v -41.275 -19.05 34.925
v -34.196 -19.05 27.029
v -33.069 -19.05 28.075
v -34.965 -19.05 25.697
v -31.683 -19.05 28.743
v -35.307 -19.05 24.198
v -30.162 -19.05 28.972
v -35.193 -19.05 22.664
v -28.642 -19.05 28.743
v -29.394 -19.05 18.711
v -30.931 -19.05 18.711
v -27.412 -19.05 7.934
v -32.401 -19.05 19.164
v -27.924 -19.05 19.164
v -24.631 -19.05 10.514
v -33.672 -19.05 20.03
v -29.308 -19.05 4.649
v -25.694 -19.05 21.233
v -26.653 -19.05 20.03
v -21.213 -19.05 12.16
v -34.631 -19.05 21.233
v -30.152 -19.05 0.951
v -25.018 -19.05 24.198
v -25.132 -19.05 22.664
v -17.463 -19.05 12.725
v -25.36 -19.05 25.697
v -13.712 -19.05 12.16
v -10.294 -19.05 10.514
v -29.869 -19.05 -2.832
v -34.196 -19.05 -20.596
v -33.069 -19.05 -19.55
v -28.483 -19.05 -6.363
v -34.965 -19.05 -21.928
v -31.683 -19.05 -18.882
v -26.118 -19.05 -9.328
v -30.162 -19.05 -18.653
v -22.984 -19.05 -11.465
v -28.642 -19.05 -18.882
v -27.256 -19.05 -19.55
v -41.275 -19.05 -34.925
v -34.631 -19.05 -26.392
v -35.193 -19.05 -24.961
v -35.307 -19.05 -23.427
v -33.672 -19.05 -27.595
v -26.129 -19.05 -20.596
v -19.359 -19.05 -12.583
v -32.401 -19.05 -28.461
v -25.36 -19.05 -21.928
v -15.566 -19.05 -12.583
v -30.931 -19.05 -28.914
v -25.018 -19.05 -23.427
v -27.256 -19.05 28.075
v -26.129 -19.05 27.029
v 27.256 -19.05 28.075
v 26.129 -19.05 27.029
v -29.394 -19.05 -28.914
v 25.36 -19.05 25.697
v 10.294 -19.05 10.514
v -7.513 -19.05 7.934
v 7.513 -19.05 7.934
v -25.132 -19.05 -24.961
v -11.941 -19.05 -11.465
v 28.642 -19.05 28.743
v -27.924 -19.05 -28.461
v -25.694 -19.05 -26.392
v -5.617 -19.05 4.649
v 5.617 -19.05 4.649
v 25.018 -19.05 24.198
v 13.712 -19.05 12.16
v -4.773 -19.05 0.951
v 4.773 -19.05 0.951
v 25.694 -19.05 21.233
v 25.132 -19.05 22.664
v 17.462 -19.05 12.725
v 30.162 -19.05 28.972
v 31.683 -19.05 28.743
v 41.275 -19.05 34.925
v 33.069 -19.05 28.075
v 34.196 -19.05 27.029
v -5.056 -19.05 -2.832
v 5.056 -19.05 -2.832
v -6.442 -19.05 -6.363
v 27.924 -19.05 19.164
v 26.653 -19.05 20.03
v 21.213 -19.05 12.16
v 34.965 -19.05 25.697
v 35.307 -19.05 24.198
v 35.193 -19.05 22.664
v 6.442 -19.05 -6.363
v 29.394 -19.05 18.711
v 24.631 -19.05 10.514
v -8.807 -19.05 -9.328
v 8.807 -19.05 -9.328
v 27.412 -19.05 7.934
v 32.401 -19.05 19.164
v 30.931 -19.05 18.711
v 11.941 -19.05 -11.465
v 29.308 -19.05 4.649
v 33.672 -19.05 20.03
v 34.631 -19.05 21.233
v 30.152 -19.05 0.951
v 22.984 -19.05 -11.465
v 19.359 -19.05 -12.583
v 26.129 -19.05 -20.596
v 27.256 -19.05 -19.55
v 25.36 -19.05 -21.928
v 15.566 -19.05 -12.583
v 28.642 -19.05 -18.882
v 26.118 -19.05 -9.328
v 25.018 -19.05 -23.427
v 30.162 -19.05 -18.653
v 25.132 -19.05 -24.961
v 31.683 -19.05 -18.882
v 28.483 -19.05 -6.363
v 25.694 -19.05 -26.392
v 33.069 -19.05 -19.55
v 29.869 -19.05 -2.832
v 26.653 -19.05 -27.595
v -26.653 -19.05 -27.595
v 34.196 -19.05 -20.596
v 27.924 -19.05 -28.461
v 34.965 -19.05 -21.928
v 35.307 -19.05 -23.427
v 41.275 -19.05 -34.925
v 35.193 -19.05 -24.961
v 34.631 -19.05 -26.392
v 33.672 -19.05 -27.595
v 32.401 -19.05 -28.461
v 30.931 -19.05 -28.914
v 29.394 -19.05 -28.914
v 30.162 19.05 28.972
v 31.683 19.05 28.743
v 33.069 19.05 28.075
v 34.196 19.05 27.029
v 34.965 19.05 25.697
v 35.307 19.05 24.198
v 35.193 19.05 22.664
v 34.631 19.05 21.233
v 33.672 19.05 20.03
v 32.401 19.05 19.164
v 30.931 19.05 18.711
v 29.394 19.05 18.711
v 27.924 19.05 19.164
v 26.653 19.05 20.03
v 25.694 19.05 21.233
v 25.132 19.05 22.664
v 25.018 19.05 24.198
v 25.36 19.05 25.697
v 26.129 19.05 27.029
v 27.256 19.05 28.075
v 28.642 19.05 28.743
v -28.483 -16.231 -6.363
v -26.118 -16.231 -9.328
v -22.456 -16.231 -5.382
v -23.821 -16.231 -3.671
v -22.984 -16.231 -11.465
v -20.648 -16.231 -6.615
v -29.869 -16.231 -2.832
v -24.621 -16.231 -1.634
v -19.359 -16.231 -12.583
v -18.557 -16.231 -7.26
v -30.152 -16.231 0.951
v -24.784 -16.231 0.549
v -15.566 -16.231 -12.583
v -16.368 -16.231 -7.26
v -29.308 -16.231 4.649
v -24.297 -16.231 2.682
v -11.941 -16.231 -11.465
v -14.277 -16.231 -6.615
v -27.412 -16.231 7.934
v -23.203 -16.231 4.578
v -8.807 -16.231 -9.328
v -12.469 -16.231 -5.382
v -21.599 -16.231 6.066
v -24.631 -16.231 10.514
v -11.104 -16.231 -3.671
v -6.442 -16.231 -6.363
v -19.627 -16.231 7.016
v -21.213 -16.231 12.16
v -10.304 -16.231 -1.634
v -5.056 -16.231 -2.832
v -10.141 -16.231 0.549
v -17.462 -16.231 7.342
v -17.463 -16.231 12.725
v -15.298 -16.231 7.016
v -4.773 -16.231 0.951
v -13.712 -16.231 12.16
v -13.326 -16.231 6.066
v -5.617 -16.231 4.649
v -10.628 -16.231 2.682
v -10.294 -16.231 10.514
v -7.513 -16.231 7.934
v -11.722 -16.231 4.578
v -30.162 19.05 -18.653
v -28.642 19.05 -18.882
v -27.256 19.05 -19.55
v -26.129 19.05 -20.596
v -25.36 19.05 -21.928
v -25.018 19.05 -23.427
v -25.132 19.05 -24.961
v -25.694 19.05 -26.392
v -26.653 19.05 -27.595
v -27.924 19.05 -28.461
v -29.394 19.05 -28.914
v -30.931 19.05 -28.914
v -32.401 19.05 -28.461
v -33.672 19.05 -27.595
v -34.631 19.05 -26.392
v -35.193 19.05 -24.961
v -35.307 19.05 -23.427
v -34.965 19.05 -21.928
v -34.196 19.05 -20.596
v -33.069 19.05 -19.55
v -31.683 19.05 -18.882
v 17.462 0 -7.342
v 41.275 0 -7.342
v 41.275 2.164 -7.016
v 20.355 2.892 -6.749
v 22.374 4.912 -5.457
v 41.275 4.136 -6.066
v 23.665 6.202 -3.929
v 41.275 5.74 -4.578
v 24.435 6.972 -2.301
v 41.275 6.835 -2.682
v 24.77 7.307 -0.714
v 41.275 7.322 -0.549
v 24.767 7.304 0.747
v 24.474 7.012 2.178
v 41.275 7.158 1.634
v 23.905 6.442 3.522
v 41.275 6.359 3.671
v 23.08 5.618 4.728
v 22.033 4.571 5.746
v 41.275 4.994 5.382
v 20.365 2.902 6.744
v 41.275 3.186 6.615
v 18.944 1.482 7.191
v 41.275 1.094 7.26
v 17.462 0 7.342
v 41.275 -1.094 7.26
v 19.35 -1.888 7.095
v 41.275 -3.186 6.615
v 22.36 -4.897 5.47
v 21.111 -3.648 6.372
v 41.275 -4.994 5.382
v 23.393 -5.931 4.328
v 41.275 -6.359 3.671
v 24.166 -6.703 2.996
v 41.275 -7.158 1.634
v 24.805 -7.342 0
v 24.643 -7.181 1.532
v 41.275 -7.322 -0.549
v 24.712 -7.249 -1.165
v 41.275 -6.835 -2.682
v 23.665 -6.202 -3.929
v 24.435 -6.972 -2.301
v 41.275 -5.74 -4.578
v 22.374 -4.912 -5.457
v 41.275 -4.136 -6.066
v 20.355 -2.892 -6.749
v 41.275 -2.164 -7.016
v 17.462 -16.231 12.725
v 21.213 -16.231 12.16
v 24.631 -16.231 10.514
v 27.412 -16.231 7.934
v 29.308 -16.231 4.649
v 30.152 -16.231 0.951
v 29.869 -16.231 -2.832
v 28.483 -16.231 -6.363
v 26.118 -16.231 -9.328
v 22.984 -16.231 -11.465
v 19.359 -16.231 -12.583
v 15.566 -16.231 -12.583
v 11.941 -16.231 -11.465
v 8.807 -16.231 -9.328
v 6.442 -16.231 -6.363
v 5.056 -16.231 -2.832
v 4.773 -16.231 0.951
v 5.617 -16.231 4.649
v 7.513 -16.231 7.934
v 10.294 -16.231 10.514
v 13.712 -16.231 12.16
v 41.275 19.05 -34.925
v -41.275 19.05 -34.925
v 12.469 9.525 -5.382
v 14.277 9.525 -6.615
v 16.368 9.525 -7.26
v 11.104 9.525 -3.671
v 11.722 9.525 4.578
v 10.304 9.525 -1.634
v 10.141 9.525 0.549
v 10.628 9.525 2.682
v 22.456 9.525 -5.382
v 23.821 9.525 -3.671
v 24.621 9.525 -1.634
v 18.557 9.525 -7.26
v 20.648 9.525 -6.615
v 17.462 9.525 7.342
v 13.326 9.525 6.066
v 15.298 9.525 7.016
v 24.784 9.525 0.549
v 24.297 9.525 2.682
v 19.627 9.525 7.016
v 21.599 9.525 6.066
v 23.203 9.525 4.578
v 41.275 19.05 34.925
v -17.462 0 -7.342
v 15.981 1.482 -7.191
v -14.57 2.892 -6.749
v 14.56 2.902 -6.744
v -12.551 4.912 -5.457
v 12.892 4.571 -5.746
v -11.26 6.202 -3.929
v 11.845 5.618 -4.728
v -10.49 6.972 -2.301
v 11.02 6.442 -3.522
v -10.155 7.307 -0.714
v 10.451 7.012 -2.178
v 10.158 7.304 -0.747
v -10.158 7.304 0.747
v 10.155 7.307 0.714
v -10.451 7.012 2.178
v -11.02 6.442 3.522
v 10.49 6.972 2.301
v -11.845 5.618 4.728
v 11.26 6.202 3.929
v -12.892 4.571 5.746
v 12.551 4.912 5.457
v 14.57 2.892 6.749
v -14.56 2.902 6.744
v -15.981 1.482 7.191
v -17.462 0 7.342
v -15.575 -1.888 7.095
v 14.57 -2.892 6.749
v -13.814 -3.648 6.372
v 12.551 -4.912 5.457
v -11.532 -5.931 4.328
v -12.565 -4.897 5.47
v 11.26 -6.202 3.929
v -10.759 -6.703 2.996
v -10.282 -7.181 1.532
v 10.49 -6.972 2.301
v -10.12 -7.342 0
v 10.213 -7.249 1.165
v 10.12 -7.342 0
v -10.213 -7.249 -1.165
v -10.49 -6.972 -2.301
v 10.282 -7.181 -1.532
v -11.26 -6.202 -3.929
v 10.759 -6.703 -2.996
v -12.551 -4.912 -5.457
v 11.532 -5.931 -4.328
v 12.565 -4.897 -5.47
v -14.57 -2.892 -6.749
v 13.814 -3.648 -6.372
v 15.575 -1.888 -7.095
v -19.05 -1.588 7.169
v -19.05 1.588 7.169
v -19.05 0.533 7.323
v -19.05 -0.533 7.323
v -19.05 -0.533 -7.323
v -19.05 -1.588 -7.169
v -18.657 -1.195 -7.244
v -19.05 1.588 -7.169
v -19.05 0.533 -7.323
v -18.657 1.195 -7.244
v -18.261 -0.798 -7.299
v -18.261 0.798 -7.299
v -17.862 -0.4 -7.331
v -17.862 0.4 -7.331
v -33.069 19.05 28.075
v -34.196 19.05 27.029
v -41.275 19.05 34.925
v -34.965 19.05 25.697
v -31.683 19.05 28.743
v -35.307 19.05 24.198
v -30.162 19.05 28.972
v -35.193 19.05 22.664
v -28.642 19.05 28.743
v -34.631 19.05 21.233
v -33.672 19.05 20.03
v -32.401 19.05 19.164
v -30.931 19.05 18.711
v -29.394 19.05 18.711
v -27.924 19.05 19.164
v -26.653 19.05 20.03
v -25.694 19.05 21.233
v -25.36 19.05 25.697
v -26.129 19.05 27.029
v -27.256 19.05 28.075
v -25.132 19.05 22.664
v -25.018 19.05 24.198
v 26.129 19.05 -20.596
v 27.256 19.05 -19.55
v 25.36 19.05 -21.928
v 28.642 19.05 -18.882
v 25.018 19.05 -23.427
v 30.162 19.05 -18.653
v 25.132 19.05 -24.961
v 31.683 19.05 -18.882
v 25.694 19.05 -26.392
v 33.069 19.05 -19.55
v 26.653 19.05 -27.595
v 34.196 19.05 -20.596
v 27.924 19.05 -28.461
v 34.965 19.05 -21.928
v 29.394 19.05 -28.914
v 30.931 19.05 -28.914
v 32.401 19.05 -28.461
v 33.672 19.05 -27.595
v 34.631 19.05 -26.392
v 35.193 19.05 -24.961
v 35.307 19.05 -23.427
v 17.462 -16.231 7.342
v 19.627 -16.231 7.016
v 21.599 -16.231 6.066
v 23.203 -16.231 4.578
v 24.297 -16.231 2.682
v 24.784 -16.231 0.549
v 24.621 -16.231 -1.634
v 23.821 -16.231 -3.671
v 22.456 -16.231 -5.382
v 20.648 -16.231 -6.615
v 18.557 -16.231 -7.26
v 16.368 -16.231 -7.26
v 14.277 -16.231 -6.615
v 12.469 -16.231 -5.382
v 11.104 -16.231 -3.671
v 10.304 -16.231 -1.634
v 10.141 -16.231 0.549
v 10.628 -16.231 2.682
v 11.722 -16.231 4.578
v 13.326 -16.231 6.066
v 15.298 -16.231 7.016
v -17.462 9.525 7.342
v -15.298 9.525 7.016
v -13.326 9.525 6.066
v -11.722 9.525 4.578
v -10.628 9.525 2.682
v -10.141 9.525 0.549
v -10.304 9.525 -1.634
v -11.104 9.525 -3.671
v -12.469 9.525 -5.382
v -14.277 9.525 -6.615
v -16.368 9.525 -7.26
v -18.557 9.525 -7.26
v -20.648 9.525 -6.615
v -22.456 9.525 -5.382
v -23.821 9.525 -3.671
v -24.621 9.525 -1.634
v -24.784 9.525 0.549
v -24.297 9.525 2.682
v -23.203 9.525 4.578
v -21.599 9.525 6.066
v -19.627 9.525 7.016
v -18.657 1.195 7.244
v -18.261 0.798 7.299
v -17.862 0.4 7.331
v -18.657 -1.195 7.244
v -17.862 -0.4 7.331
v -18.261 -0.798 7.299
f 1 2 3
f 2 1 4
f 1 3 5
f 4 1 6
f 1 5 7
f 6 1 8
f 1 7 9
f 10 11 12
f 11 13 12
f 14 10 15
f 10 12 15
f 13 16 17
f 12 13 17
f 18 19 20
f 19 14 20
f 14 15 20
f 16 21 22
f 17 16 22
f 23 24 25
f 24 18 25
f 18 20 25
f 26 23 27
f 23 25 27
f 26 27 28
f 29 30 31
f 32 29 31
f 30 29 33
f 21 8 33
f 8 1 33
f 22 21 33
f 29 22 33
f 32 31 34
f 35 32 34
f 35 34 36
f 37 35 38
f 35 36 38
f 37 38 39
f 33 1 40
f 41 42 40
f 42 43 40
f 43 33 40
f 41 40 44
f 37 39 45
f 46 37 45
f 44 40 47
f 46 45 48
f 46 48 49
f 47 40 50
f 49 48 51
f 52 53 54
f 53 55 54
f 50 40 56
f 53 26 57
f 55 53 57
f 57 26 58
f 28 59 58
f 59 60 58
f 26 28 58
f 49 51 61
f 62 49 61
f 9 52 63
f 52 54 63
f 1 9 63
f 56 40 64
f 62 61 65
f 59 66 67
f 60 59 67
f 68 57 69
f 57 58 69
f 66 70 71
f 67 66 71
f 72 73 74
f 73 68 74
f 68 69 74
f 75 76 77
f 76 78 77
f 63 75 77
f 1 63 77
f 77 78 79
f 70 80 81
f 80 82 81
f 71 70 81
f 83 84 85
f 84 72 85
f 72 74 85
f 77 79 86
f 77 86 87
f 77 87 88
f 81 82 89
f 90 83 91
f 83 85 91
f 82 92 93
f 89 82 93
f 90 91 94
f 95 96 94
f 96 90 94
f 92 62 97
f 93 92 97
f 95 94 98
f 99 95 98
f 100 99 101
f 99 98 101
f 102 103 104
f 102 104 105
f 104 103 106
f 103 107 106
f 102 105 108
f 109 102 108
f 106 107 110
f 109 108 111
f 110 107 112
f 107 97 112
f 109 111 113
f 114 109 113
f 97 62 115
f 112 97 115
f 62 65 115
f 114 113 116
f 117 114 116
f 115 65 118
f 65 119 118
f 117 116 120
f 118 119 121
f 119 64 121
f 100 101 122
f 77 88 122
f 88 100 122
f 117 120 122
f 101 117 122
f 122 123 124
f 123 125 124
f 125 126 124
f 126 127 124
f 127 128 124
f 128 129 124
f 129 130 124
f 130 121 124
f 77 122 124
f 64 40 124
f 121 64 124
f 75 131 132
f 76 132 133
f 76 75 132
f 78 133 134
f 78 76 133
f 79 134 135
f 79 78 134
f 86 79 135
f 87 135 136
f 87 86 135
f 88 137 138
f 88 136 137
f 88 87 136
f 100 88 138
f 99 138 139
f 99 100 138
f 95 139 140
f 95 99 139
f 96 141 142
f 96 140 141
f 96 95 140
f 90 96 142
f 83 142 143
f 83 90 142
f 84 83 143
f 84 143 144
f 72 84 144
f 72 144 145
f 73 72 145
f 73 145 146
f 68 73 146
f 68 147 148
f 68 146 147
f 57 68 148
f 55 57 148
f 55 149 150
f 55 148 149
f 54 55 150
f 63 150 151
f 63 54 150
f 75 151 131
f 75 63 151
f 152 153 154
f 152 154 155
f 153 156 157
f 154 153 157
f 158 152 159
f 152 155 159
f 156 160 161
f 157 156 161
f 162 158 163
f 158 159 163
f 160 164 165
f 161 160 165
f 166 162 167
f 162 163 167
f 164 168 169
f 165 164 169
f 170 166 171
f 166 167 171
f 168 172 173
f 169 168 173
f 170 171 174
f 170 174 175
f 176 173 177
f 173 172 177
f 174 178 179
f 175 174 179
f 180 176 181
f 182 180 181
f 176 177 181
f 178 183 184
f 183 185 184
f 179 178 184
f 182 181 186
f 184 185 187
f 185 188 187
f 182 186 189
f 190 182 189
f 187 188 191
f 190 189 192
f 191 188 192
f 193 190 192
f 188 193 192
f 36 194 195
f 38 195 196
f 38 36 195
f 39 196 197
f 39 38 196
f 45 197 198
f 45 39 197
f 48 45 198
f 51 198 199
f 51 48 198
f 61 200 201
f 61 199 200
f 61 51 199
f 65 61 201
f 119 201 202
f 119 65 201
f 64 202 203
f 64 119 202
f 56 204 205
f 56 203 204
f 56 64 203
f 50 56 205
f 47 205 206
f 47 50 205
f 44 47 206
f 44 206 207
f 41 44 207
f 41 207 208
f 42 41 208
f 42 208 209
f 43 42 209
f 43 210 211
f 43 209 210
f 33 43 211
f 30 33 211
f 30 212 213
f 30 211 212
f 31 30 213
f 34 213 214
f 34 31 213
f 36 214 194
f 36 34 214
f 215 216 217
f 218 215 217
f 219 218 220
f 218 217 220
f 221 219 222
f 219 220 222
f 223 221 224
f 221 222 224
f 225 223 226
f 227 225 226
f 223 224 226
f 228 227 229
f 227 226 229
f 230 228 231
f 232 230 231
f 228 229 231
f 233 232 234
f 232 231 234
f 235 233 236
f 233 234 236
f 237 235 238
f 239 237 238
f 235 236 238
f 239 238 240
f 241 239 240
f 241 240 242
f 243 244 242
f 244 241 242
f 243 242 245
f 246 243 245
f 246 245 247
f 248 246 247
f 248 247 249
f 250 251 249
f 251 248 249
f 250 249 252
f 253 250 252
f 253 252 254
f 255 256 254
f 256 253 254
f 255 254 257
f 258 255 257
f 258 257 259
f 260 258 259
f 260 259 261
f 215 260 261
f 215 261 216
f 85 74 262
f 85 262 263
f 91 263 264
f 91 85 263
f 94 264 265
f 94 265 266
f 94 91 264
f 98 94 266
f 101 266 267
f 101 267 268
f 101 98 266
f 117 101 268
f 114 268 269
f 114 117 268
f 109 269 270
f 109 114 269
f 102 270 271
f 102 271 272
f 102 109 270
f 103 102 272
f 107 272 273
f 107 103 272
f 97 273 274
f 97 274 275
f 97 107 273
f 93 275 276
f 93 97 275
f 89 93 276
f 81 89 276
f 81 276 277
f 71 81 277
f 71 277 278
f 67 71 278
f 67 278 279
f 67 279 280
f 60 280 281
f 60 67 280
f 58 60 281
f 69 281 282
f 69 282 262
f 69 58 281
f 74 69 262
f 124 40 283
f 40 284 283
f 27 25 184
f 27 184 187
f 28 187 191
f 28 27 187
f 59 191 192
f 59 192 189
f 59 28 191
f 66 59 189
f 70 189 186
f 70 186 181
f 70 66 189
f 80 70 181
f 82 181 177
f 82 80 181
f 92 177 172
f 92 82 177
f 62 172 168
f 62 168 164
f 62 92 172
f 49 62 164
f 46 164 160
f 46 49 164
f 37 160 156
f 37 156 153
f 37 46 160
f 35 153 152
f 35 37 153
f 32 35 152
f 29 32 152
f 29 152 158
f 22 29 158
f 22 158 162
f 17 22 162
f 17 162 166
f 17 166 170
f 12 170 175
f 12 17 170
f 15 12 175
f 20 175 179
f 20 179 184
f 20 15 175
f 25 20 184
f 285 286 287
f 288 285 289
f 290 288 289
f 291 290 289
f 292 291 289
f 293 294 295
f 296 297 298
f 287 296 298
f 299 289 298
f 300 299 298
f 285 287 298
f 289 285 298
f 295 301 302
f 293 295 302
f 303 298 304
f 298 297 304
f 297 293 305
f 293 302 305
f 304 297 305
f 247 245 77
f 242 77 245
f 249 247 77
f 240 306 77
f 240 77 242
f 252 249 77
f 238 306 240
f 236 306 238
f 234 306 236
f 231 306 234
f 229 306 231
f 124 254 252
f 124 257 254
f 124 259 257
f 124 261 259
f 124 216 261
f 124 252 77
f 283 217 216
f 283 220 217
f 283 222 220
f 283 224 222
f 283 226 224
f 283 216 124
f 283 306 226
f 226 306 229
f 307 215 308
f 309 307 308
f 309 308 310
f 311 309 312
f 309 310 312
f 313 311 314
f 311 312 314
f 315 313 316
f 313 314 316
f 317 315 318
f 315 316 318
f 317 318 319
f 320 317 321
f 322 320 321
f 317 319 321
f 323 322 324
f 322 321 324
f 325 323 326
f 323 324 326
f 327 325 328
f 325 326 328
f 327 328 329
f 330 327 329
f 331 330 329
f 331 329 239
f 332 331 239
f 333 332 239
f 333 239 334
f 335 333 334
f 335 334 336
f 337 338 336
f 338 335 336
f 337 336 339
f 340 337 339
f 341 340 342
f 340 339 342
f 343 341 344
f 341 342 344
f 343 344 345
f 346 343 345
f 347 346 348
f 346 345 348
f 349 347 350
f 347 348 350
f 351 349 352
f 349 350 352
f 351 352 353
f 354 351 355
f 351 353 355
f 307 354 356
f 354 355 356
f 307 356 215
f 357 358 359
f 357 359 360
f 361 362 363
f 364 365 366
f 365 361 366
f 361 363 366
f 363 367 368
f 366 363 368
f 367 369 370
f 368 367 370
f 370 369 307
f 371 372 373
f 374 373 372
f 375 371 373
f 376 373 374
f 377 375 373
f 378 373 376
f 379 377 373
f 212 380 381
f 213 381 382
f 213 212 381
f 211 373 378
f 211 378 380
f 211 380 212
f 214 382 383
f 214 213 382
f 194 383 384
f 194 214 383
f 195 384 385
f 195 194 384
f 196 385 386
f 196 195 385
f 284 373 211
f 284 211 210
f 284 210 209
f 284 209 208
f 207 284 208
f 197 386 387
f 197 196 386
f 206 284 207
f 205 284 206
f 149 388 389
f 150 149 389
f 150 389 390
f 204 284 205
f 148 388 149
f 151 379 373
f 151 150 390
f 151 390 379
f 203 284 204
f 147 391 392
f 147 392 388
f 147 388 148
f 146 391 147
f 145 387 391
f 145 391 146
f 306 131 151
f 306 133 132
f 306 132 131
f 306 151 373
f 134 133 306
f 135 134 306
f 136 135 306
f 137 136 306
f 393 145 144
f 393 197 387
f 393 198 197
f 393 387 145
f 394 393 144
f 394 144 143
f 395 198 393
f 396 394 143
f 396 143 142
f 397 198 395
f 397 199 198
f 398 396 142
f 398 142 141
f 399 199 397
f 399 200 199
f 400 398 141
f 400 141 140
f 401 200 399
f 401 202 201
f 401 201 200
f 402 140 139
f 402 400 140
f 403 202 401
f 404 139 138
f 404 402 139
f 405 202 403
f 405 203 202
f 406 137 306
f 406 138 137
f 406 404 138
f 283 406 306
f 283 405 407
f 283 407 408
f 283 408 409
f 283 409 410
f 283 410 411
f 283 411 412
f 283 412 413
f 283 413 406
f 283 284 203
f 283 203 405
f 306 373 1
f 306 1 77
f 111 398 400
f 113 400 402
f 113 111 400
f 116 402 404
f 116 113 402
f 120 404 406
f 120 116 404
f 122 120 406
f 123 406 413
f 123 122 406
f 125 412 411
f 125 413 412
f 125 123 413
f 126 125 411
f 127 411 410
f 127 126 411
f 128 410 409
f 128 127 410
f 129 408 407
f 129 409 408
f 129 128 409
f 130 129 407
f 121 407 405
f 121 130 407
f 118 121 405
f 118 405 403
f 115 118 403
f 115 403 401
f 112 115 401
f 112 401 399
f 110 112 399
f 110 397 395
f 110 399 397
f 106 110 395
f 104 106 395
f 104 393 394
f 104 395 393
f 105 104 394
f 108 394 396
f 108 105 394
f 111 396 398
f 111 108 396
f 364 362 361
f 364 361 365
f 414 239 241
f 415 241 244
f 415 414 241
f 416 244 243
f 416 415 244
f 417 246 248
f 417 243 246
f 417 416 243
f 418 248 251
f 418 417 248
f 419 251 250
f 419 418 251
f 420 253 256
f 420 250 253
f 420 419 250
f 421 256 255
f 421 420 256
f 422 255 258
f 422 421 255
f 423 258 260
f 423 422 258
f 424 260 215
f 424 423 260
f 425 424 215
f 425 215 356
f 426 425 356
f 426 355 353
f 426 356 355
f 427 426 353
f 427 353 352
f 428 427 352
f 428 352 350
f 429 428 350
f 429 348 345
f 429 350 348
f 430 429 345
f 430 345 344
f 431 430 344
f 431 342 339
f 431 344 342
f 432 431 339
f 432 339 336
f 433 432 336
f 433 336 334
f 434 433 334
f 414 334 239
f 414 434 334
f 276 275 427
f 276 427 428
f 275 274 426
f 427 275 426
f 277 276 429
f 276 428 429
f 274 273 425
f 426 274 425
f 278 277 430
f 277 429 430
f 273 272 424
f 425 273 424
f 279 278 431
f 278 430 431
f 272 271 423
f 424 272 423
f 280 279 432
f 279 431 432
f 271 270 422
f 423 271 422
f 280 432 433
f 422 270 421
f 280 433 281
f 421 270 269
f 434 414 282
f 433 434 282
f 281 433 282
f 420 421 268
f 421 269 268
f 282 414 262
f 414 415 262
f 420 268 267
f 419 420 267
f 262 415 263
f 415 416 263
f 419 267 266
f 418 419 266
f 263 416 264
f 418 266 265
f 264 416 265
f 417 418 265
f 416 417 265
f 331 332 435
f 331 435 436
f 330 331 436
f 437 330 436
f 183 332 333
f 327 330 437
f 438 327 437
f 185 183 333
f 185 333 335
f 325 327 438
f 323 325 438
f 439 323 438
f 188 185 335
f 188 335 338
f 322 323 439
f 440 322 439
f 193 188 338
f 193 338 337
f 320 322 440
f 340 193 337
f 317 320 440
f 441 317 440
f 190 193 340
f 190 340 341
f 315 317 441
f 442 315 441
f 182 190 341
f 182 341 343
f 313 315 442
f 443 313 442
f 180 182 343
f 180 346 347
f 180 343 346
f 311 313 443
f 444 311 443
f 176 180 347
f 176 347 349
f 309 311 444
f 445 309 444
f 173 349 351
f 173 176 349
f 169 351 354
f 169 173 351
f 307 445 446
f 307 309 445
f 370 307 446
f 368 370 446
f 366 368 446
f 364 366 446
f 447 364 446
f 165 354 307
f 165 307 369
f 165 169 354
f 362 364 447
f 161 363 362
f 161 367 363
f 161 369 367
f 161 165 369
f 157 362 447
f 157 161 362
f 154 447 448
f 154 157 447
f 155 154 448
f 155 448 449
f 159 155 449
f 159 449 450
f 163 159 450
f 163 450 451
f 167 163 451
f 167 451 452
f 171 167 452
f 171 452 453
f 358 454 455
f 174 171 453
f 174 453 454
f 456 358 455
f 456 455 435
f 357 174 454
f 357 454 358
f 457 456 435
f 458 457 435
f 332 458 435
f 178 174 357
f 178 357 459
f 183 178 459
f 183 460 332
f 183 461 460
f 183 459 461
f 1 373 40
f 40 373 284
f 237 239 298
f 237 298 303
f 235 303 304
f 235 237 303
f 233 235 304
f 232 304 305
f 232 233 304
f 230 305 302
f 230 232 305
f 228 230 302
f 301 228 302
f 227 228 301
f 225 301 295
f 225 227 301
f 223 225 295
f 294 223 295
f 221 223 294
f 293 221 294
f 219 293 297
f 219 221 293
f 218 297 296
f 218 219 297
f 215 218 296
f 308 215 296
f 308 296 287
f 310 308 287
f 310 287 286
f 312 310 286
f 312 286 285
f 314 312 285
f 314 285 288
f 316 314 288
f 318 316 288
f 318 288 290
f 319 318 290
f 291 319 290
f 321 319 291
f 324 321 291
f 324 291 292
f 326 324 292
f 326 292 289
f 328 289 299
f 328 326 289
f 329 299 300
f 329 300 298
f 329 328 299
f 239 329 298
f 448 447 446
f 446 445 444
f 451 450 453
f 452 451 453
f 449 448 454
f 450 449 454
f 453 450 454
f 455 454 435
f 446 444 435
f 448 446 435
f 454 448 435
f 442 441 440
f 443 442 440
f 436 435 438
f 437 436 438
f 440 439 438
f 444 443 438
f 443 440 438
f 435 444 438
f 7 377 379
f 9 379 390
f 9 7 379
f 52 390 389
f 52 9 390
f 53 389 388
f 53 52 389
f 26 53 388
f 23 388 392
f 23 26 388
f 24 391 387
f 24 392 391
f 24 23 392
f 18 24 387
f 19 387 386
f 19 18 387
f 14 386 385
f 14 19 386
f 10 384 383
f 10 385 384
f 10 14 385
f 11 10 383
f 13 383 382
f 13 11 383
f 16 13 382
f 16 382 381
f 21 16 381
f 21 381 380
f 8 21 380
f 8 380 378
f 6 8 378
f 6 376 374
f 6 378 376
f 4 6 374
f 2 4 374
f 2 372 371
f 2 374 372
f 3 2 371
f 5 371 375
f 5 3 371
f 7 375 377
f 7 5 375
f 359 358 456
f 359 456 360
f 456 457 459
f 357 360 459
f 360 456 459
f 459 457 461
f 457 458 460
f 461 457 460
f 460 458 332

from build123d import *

# Parameters (mm, degrees)
SKETCH1_W           = 82.55
SKETCH1_H           = 69.85
BOSS_EXTRUDE1_DEPTH = 19.05
CUT_EXTRUDE2_START  = -19.05
SKETCH2_R           = 5.159375
CUT_EXTRUDE2_DEPTH  = 77.376117521
CUT_EXTRUDE4_START  = -19.05
SKETCH3_R           = 7.3421875
CUT_EXTRUDE4_DEPTH  = 28.575
CUT_EXTRUDE6_START  = -19.05
SKETCH4_R           = 12.7254
CUT_EXTRUDE6_DEPTH  = 2.8194
CUT_EXTRUDE8_START  = 41.275
SKETCH5_R           = 7.3421875
CUT_EXTRUDE8_DEPTH  = 60.325


with BuildPart() as part:
    # Sketch1 → Boss-Extrude1 (new, symmetric)
    with BuildSketch(Plane(origin=(0, 0, 0), x_dir=(1, 0, 0), z_dir=(0, 1, 0))):
        Rectangle(SKETCH1_W, SKETCH1_H)
    extrude(amount=BOSS_EXTRUDE1_DEPTH, both=True)

    # Sketch2 → Cut-Extrude2 (cut, through all)
    with BuildSketch(Plane(origin=(0, 0, 0), x_dir=(1, 0, 0), z_dir=(0, 1, 0)).offset(CUT_EXTRUDE2_START)):
        with Locations(Location((-30.1625, -23.8125, 0), (0, 0, 270))):
            Circle(SKETCH2_R)
        with Locations(Location((30.1625, -23.8125, 0), (0, 0, 270))):
            Circle(SKETCH2_R)
        with Locations(Location((-30.1625, 23.8125, 0), (0, 0, 270))):
            Circle(SKETCH2_R)
        with Locations(Location((30.1625, 23.8125, 0), (0, 0, 270))):
            Circle(SKETCH2_R)
    extrude(amount=CUT_EXTRUDE2_DEPTH, mode=Mode.SUBTRACT)

    # Sketch3 → Cut-Extrude4 (cut)
    with BuildSketch(Plane(origin=(0, 0, 0), x_dir=(1, 0, 0), z_dir=(0, 1, 0)).offset(CUT_EXTRUDE4_START)):
        with Locations(Location((-17.4625, 0, 0), (0, 0, 270))):
            Circle(SKETCH3_R)
        with Locations(Location((17.4625, 0, 0), (0, 0, 270))):
            Circle(SKETCH3_R)
    extrude(amount=CUT_EXTRUDE4_DEPTH, mode=Mode.SUBTRACT)

    # Sketch4 → Cut-Extrude6 (cut)
    with BuildSketch(Plane(origin=(0, 0, 0), x_dir=(1, 0, 0), z_dir=(0, 1, 0)).offset(CUT_EXTRUDE6_START)):
        with Locations(Location((-17.4625, 0, 0), (0, 0, 270))):
            Circle(SKETCH4_R)
        with Locations(Location((17.4625, 0, 0), (0, 0, 270))):
            Circle(SKETCH4_R)
    extrude(amount=CUT_EXTRUDE6_DEPTH, mode=Mode.SUBTRACT)

    # Sketch5 → Cut-Extrude8 (cut)
    with BuildSketch(Plane(origin=(0, 0, 0), x_dir=(0, 0, -1), z_dir=(1, 0, 0)).offset(CUT_EXTRUDE8_START)):
        Circle(SKETCH5_R)
    extrude(amount=-CUT_EXTRUDE8_DEPTH, mode=Mode.SUBTRACT)


solid = part.part
